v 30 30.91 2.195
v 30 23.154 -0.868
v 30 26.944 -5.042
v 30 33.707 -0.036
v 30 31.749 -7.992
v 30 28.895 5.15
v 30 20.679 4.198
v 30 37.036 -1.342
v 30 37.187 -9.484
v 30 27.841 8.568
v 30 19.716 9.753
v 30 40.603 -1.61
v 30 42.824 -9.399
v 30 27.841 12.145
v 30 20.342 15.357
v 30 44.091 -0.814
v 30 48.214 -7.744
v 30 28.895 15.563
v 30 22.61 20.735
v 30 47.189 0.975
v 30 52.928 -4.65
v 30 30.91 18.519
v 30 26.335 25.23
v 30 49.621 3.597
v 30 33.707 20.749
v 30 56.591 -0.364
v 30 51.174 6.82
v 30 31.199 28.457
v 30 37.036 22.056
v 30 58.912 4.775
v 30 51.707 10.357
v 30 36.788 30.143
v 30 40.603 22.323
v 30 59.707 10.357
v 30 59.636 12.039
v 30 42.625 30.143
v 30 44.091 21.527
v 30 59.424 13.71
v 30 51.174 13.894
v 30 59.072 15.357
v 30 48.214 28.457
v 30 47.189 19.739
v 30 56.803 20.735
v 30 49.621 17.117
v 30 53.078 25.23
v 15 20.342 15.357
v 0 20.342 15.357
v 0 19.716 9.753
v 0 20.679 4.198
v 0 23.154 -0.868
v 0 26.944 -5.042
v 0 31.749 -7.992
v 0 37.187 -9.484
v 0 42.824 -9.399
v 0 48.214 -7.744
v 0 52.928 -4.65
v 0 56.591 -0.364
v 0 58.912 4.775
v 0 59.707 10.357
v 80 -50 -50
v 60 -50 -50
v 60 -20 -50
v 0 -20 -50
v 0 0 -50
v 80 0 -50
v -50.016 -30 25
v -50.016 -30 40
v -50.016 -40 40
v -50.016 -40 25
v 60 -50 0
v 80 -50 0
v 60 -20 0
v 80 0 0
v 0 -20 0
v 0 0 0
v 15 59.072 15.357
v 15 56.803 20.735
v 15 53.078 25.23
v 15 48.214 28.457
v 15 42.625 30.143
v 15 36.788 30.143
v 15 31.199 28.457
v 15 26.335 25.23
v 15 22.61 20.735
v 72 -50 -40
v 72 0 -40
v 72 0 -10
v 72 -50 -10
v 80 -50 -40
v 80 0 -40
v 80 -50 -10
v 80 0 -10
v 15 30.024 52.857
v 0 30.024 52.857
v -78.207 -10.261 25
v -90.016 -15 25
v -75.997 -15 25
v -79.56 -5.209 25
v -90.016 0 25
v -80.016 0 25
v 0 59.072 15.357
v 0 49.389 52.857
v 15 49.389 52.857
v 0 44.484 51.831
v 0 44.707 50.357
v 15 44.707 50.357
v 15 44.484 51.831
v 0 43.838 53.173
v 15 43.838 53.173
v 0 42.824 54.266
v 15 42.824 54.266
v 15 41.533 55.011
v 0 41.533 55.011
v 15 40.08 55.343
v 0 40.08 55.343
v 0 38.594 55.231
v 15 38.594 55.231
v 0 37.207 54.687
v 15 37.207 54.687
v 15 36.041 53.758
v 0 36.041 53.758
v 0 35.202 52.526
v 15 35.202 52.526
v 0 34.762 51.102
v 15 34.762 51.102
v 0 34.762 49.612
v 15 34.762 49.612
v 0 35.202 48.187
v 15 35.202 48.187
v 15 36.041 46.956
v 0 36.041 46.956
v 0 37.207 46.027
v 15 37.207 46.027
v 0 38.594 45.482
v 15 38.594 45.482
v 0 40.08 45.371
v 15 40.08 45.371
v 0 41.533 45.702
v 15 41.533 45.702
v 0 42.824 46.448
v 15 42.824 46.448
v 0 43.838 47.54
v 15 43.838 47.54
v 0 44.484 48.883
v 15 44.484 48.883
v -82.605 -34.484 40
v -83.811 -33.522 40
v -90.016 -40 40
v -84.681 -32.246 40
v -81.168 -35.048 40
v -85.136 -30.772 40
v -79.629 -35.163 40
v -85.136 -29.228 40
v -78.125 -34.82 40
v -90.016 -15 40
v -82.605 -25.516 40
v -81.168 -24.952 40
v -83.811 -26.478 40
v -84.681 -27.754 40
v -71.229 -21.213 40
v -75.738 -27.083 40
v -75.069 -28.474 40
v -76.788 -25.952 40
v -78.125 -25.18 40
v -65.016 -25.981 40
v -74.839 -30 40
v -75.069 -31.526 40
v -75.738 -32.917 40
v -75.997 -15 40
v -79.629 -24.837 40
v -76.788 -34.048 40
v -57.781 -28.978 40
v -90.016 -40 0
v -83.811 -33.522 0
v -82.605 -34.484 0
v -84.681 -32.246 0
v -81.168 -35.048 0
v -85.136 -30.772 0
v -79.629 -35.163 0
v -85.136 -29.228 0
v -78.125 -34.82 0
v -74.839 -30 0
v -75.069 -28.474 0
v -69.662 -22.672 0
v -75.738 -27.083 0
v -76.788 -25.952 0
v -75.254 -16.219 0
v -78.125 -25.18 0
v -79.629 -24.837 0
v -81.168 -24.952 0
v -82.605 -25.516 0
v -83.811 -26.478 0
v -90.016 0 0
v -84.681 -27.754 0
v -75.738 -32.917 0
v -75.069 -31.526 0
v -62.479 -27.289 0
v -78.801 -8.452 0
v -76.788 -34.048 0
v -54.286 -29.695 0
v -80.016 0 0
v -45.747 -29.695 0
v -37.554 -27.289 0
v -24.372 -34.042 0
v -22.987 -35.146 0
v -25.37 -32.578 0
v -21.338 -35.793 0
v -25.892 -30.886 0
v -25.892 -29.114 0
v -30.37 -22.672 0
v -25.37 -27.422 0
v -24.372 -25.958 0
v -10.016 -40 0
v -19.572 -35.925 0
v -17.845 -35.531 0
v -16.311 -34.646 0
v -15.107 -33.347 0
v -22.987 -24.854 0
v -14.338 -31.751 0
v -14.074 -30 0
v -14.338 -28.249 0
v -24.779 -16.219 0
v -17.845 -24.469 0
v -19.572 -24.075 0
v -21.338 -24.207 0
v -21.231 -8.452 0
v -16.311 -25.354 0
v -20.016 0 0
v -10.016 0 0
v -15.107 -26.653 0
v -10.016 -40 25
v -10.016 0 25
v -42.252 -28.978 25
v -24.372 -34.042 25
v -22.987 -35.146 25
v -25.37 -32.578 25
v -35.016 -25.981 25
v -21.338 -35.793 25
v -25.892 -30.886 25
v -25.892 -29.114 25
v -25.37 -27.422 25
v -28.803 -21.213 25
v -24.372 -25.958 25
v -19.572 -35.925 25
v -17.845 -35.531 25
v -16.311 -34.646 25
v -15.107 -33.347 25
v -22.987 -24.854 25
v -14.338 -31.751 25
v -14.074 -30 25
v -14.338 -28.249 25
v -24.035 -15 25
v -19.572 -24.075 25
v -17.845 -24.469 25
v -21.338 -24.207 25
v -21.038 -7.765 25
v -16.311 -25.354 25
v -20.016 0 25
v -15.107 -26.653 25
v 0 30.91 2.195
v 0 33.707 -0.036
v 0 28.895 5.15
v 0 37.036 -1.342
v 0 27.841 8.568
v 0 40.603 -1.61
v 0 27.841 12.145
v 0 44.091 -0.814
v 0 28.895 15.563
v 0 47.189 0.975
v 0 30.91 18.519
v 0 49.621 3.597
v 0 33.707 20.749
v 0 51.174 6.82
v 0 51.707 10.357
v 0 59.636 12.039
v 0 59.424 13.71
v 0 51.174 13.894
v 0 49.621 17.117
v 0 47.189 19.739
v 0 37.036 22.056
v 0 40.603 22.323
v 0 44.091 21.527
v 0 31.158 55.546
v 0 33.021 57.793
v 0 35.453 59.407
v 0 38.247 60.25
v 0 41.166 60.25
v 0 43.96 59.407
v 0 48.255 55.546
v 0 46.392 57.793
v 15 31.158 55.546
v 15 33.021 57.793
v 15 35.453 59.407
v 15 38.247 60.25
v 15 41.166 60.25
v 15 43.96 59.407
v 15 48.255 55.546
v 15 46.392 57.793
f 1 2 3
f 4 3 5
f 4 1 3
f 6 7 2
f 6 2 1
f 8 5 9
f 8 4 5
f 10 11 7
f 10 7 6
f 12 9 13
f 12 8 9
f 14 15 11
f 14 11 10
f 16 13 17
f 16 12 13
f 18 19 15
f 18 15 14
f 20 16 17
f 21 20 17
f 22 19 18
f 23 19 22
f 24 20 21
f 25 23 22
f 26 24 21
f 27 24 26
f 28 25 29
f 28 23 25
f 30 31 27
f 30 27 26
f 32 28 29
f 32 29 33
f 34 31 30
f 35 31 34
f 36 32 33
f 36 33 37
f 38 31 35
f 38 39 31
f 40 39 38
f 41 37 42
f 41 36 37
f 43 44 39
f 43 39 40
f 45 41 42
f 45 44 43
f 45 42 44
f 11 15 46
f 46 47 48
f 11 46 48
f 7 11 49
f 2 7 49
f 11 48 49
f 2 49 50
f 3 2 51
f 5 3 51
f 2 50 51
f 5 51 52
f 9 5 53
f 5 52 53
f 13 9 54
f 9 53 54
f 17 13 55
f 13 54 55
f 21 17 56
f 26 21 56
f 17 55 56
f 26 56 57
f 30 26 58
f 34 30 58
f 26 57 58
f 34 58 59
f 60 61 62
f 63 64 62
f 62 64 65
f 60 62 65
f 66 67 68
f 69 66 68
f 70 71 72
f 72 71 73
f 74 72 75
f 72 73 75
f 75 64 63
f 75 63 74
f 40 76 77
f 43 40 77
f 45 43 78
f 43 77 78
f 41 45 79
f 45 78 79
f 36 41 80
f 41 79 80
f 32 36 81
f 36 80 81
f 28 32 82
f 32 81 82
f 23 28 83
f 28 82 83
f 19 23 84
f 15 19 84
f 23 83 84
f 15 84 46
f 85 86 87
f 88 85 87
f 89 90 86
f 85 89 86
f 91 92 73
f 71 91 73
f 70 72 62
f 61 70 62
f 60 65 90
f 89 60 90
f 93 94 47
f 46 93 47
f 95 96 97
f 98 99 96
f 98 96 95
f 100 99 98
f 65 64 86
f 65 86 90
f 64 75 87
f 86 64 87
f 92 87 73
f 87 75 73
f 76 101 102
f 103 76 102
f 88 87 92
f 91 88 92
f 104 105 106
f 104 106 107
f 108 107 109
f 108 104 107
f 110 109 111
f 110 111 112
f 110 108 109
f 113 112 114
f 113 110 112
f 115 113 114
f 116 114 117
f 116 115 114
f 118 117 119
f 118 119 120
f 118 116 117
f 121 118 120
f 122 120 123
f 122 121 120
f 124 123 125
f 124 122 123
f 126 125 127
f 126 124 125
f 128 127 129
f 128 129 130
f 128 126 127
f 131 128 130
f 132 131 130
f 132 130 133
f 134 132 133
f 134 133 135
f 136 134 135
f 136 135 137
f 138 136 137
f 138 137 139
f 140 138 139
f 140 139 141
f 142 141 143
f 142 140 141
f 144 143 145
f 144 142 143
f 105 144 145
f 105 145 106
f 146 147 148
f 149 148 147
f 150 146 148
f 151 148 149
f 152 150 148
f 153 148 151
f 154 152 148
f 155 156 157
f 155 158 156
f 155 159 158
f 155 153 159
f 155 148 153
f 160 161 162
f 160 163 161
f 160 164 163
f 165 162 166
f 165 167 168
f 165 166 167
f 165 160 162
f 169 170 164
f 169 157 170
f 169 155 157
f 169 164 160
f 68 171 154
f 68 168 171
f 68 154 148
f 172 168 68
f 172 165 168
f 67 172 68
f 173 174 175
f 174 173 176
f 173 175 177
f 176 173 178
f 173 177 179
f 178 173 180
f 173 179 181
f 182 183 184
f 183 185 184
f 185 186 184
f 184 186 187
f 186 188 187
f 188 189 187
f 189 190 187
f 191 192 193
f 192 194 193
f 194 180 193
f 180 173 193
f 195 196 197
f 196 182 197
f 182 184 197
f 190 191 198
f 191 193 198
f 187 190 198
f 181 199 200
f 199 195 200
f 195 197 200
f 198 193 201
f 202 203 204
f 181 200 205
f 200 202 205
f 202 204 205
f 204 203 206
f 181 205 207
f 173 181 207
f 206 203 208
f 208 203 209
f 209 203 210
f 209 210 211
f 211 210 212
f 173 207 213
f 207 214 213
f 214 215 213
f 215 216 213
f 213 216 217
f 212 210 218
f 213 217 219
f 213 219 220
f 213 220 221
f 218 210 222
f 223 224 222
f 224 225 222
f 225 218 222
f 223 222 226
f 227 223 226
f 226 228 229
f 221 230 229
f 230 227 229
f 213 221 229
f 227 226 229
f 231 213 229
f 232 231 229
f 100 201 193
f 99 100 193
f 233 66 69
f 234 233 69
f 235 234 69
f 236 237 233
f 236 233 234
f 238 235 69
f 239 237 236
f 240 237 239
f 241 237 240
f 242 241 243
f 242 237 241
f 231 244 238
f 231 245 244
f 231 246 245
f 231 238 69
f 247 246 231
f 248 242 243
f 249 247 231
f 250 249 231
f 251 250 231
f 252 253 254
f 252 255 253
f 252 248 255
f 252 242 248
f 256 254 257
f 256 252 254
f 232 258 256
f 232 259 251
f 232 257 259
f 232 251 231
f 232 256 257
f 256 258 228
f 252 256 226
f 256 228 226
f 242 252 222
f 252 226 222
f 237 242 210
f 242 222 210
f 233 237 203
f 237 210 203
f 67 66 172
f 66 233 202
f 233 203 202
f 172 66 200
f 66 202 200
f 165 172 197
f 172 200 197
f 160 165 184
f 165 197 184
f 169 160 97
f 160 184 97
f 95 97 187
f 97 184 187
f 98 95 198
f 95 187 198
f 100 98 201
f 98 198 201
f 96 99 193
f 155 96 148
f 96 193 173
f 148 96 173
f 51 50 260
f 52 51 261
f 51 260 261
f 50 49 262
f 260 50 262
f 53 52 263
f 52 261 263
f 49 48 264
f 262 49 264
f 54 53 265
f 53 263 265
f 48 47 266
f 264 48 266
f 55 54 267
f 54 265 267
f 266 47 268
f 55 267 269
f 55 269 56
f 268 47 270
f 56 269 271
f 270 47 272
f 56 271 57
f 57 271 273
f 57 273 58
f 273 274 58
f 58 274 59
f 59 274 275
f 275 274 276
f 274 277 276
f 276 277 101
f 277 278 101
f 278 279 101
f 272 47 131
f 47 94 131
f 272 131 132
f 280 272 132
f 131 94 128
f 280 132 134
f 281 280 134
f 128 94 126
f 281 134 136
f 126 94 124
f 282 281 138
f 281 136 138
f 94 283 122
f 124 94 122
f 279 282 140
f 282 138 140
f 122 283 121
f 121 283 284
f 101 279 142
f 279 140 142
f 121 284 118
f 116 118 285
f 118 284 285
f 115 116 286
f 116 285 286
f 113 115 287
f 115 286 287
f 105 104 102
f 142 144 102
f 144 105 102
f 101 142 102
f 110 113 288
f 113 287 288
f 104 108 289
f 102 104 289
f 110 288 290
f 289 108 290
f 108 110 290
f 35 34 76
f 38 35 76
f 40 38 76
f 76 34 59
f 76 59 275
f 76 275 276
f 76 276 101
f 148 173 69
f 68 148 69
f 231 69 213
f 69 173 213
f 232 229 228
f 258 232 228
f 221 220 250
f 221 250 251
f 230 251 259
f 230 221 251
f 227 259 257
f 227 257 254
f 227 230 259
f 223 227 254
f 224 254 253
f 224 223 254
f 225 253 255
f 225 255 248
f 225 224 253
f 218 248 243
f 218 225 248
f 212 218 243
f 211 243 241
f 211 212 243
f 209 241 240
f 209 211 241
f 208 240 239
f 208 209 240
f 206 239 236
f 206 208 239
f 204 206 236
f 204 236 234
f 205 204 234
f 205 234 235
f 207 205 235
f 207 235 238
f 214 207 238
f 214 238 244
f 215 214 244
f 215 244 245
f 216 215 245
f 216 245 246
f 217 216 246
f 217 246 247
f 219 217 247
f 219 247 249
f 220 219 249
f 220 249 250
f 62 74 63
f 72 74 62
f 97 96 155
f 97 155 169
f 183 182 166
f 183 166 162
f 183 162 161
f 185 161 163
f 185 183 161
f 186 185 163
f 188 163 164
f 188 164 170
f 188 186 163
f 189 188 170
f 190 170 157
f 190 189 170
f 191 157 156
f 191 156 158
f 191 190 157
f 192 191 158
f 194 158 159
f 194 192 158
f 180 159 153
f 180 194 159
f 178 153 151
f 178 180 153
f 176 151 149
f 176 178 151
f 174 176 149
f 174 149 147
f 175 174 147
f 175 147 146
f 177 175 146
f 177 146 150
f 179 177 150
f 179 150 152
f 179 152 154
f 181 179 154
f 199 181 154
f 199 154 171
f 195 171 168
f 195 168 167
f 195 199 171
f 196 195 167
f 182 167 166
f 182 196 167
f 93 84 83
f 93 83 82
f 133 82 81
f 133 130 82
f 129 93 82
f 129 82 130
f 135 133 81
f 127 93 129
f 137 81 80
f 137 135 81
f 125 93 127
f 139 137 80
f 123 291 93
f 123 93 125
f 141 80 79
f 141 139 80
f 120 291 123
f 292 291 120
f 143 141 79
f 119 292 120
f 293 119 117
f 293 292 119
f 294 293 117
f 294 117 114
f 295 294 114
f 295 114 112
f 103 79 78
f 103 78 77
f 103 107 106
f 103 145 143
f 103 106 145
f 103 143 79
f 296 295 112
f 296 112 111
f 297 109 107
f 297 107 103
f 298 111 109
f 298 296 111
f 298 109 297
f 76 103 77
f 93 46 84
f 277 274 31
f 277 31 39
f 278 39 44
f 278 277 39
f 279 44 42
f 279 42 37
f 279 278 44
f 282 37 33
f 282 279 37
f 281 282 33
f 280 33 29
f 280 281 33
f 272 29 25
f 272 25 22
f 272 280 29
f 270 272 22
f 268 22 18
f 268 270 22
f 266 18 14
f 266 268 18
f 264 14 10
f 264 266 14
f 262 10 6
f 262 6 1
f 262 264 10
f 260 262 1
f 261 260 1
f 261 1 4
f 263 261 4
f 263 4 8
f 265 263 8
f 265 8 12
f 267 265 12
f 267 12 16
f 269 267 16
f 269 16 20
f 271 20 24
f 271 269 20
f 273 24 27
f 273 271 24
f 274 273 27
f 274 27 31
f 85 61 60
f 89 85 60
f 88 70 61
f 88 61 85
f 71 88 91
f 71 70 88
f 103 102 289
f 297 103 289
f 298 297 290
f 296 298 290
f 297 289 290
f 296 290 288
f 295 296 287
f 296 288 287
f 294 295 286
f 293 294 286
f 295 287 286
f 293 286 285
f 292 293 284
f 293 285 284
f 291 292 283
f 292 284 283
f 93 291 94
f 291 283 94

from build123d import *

# Parameters (mm, degrees)
F0_W     = 60
F0_H     = 50
F1_DEPTH = 20
F2_DEPTH = 50
F3_R     = 12
F4_DEPTH = 30
F3_R_2   = 5
F5_DEPTH = 15
F6_R     = 5.1774558674
F6_R_2   = 5.9420738314
F7_DEPTH = 40
F8_R     = 5.9420738314
F9_DEPTH = 15


with BuildPart() as f1:
    # F0 (on Front) → F1 (new body)
    with BuildSketch(Plane.XZ):
        with Locations((30, -25)):
            Rectangle(F0_W, F0_H)
    extrude(amount=F1_DEPTH)

    # F0 (on Front) → F2 (join)
    with BuildSketch(Plane.XZ):
        Polygon((80, 0), (60, 0), (60, -50), (80, -50), (80, -40), (72, -40), (72, -10), (80, -10), align=None)
    extrude(amount=F2_DEPTH)


with BuildPart() as f4:
    # F3 (on Right) → F4 (new body)
    with BuildSketch(Plane.YZ):
        with BuildLine():
            ThreePointArc((20.3417120386, 15.3567687949), (37.18654292, -9.4838251305), (59.7066287696, 10.3567687949))
            ThreePointArc((59.7066287696, 10.3567687949), (59.547222695, 12.8768546445), (59.0715455007, 15.3567687949))
            ThreePointArc((59.0715455007, 15.3567687949), (39.7066287696, 30.3567687949), (20.3417120386, 15.3567687949))
        make_face()
        with Locations((39.7066287696, 10.3567687949)):
            Circle(F3_R, mode=Mode.SUBTRACT)
    extrude(amount=F4_DEPTH)

    # F3 (on Right) → F5 (join)
    with BuildSketch(Plane.YZ):
        with BuildLine():
            ThreePointArc((20.3417120386, 15.3567687949), (39.7066287696, 30.3567687949), (59.0715455007, 15.3567687949))
            Line((59.0715455007, 15.3567687949), (49.3890871352, 52.8567687949))
            ThreePointArc((49.3890871352, 52.8567687949), (39.7066287696, 60.3567687949), (30.0241704041, 52.8567687949))
            Line((30.0241704041, 52.8567687949), (20.3417120386, 15.3567687949))
        make_face()
        with Locations((39.7066287696, 50.3567687949)):
            Circle(F3_R_2, mode=Mode.SUBTRACT)
    extrude(amount=F5_DEPTH)


with BuildPart() as f7:
    # F6 (on Top) → F7 (new body)
    with BuildSketch(Plane.XY):
        with BuildLine():
            Line((-80.0161100341, 0), (-90.0161100341, 0))
            Line((-90.0161100341, 0), (-90.0161100341, -40))
            Line((-90.0161100341, -40), (-10.0161100341, -40))
            Line((-10.0161100341, -40), (-10.0161100341, 0))
            Line((-10.0161100341, 0), (-20.0161100341, 0))
            ThreePointArc((-20.0161100341, 0), (-50.0161100341, -30), (-80.0161100341, 0))
        make_face()
        with Locations((-80.0161100341, -30)):
            Circle(F6_R, mode=Mode.SUBTRACT)
        with Locations((-20.0161100341, -30)):
            Circle(F6_R_2, mode=Mode.SUBTRACT)
    extrude(amount=F7_DEPTH)

    # F8 (on face) → F9 (cut)
    with BuildSketch(Plane.XY.offset(40)):
        with BuildLine():
            Line((-90.0161100341, 0), (-90.0161100341, -15))
            Line((-90.0161100341, -15), (-75.9968721476, -15))
            ThreePointArc((-75.9968721476, -15), (-78.9938848227, -7.7645713531), (-80.0161100341, 0))
            Line((-80.0161100341, 0), (-90.0161100341, 0))
        make_face()
        with BuildLine():
            ThreePointArc((-20.0161100341, 0), (-28.8029065985, -21.2132034356), (-50.0161100341, -30))
            Line((-50.0161100341, -30), (-50.0161100341, -40))
            Line((-50.0161100341, -40), (-10.0161100341, -40))
            Line((-10.0161100341, -40), (-10.0161100341, 0))
            Line((-10.0161100341, 0), (-20.0161100341, 0))
        make_face()
        with Locations((-20.0161100341, -30)):
            Circle(F8_R, mode=Mode.SUBTRACT)
    extrude(amount=-F9_DEPTH, mode=Mode.SUBTRACT)


solid = Compound([f1.part, f4.part, f7.part])
